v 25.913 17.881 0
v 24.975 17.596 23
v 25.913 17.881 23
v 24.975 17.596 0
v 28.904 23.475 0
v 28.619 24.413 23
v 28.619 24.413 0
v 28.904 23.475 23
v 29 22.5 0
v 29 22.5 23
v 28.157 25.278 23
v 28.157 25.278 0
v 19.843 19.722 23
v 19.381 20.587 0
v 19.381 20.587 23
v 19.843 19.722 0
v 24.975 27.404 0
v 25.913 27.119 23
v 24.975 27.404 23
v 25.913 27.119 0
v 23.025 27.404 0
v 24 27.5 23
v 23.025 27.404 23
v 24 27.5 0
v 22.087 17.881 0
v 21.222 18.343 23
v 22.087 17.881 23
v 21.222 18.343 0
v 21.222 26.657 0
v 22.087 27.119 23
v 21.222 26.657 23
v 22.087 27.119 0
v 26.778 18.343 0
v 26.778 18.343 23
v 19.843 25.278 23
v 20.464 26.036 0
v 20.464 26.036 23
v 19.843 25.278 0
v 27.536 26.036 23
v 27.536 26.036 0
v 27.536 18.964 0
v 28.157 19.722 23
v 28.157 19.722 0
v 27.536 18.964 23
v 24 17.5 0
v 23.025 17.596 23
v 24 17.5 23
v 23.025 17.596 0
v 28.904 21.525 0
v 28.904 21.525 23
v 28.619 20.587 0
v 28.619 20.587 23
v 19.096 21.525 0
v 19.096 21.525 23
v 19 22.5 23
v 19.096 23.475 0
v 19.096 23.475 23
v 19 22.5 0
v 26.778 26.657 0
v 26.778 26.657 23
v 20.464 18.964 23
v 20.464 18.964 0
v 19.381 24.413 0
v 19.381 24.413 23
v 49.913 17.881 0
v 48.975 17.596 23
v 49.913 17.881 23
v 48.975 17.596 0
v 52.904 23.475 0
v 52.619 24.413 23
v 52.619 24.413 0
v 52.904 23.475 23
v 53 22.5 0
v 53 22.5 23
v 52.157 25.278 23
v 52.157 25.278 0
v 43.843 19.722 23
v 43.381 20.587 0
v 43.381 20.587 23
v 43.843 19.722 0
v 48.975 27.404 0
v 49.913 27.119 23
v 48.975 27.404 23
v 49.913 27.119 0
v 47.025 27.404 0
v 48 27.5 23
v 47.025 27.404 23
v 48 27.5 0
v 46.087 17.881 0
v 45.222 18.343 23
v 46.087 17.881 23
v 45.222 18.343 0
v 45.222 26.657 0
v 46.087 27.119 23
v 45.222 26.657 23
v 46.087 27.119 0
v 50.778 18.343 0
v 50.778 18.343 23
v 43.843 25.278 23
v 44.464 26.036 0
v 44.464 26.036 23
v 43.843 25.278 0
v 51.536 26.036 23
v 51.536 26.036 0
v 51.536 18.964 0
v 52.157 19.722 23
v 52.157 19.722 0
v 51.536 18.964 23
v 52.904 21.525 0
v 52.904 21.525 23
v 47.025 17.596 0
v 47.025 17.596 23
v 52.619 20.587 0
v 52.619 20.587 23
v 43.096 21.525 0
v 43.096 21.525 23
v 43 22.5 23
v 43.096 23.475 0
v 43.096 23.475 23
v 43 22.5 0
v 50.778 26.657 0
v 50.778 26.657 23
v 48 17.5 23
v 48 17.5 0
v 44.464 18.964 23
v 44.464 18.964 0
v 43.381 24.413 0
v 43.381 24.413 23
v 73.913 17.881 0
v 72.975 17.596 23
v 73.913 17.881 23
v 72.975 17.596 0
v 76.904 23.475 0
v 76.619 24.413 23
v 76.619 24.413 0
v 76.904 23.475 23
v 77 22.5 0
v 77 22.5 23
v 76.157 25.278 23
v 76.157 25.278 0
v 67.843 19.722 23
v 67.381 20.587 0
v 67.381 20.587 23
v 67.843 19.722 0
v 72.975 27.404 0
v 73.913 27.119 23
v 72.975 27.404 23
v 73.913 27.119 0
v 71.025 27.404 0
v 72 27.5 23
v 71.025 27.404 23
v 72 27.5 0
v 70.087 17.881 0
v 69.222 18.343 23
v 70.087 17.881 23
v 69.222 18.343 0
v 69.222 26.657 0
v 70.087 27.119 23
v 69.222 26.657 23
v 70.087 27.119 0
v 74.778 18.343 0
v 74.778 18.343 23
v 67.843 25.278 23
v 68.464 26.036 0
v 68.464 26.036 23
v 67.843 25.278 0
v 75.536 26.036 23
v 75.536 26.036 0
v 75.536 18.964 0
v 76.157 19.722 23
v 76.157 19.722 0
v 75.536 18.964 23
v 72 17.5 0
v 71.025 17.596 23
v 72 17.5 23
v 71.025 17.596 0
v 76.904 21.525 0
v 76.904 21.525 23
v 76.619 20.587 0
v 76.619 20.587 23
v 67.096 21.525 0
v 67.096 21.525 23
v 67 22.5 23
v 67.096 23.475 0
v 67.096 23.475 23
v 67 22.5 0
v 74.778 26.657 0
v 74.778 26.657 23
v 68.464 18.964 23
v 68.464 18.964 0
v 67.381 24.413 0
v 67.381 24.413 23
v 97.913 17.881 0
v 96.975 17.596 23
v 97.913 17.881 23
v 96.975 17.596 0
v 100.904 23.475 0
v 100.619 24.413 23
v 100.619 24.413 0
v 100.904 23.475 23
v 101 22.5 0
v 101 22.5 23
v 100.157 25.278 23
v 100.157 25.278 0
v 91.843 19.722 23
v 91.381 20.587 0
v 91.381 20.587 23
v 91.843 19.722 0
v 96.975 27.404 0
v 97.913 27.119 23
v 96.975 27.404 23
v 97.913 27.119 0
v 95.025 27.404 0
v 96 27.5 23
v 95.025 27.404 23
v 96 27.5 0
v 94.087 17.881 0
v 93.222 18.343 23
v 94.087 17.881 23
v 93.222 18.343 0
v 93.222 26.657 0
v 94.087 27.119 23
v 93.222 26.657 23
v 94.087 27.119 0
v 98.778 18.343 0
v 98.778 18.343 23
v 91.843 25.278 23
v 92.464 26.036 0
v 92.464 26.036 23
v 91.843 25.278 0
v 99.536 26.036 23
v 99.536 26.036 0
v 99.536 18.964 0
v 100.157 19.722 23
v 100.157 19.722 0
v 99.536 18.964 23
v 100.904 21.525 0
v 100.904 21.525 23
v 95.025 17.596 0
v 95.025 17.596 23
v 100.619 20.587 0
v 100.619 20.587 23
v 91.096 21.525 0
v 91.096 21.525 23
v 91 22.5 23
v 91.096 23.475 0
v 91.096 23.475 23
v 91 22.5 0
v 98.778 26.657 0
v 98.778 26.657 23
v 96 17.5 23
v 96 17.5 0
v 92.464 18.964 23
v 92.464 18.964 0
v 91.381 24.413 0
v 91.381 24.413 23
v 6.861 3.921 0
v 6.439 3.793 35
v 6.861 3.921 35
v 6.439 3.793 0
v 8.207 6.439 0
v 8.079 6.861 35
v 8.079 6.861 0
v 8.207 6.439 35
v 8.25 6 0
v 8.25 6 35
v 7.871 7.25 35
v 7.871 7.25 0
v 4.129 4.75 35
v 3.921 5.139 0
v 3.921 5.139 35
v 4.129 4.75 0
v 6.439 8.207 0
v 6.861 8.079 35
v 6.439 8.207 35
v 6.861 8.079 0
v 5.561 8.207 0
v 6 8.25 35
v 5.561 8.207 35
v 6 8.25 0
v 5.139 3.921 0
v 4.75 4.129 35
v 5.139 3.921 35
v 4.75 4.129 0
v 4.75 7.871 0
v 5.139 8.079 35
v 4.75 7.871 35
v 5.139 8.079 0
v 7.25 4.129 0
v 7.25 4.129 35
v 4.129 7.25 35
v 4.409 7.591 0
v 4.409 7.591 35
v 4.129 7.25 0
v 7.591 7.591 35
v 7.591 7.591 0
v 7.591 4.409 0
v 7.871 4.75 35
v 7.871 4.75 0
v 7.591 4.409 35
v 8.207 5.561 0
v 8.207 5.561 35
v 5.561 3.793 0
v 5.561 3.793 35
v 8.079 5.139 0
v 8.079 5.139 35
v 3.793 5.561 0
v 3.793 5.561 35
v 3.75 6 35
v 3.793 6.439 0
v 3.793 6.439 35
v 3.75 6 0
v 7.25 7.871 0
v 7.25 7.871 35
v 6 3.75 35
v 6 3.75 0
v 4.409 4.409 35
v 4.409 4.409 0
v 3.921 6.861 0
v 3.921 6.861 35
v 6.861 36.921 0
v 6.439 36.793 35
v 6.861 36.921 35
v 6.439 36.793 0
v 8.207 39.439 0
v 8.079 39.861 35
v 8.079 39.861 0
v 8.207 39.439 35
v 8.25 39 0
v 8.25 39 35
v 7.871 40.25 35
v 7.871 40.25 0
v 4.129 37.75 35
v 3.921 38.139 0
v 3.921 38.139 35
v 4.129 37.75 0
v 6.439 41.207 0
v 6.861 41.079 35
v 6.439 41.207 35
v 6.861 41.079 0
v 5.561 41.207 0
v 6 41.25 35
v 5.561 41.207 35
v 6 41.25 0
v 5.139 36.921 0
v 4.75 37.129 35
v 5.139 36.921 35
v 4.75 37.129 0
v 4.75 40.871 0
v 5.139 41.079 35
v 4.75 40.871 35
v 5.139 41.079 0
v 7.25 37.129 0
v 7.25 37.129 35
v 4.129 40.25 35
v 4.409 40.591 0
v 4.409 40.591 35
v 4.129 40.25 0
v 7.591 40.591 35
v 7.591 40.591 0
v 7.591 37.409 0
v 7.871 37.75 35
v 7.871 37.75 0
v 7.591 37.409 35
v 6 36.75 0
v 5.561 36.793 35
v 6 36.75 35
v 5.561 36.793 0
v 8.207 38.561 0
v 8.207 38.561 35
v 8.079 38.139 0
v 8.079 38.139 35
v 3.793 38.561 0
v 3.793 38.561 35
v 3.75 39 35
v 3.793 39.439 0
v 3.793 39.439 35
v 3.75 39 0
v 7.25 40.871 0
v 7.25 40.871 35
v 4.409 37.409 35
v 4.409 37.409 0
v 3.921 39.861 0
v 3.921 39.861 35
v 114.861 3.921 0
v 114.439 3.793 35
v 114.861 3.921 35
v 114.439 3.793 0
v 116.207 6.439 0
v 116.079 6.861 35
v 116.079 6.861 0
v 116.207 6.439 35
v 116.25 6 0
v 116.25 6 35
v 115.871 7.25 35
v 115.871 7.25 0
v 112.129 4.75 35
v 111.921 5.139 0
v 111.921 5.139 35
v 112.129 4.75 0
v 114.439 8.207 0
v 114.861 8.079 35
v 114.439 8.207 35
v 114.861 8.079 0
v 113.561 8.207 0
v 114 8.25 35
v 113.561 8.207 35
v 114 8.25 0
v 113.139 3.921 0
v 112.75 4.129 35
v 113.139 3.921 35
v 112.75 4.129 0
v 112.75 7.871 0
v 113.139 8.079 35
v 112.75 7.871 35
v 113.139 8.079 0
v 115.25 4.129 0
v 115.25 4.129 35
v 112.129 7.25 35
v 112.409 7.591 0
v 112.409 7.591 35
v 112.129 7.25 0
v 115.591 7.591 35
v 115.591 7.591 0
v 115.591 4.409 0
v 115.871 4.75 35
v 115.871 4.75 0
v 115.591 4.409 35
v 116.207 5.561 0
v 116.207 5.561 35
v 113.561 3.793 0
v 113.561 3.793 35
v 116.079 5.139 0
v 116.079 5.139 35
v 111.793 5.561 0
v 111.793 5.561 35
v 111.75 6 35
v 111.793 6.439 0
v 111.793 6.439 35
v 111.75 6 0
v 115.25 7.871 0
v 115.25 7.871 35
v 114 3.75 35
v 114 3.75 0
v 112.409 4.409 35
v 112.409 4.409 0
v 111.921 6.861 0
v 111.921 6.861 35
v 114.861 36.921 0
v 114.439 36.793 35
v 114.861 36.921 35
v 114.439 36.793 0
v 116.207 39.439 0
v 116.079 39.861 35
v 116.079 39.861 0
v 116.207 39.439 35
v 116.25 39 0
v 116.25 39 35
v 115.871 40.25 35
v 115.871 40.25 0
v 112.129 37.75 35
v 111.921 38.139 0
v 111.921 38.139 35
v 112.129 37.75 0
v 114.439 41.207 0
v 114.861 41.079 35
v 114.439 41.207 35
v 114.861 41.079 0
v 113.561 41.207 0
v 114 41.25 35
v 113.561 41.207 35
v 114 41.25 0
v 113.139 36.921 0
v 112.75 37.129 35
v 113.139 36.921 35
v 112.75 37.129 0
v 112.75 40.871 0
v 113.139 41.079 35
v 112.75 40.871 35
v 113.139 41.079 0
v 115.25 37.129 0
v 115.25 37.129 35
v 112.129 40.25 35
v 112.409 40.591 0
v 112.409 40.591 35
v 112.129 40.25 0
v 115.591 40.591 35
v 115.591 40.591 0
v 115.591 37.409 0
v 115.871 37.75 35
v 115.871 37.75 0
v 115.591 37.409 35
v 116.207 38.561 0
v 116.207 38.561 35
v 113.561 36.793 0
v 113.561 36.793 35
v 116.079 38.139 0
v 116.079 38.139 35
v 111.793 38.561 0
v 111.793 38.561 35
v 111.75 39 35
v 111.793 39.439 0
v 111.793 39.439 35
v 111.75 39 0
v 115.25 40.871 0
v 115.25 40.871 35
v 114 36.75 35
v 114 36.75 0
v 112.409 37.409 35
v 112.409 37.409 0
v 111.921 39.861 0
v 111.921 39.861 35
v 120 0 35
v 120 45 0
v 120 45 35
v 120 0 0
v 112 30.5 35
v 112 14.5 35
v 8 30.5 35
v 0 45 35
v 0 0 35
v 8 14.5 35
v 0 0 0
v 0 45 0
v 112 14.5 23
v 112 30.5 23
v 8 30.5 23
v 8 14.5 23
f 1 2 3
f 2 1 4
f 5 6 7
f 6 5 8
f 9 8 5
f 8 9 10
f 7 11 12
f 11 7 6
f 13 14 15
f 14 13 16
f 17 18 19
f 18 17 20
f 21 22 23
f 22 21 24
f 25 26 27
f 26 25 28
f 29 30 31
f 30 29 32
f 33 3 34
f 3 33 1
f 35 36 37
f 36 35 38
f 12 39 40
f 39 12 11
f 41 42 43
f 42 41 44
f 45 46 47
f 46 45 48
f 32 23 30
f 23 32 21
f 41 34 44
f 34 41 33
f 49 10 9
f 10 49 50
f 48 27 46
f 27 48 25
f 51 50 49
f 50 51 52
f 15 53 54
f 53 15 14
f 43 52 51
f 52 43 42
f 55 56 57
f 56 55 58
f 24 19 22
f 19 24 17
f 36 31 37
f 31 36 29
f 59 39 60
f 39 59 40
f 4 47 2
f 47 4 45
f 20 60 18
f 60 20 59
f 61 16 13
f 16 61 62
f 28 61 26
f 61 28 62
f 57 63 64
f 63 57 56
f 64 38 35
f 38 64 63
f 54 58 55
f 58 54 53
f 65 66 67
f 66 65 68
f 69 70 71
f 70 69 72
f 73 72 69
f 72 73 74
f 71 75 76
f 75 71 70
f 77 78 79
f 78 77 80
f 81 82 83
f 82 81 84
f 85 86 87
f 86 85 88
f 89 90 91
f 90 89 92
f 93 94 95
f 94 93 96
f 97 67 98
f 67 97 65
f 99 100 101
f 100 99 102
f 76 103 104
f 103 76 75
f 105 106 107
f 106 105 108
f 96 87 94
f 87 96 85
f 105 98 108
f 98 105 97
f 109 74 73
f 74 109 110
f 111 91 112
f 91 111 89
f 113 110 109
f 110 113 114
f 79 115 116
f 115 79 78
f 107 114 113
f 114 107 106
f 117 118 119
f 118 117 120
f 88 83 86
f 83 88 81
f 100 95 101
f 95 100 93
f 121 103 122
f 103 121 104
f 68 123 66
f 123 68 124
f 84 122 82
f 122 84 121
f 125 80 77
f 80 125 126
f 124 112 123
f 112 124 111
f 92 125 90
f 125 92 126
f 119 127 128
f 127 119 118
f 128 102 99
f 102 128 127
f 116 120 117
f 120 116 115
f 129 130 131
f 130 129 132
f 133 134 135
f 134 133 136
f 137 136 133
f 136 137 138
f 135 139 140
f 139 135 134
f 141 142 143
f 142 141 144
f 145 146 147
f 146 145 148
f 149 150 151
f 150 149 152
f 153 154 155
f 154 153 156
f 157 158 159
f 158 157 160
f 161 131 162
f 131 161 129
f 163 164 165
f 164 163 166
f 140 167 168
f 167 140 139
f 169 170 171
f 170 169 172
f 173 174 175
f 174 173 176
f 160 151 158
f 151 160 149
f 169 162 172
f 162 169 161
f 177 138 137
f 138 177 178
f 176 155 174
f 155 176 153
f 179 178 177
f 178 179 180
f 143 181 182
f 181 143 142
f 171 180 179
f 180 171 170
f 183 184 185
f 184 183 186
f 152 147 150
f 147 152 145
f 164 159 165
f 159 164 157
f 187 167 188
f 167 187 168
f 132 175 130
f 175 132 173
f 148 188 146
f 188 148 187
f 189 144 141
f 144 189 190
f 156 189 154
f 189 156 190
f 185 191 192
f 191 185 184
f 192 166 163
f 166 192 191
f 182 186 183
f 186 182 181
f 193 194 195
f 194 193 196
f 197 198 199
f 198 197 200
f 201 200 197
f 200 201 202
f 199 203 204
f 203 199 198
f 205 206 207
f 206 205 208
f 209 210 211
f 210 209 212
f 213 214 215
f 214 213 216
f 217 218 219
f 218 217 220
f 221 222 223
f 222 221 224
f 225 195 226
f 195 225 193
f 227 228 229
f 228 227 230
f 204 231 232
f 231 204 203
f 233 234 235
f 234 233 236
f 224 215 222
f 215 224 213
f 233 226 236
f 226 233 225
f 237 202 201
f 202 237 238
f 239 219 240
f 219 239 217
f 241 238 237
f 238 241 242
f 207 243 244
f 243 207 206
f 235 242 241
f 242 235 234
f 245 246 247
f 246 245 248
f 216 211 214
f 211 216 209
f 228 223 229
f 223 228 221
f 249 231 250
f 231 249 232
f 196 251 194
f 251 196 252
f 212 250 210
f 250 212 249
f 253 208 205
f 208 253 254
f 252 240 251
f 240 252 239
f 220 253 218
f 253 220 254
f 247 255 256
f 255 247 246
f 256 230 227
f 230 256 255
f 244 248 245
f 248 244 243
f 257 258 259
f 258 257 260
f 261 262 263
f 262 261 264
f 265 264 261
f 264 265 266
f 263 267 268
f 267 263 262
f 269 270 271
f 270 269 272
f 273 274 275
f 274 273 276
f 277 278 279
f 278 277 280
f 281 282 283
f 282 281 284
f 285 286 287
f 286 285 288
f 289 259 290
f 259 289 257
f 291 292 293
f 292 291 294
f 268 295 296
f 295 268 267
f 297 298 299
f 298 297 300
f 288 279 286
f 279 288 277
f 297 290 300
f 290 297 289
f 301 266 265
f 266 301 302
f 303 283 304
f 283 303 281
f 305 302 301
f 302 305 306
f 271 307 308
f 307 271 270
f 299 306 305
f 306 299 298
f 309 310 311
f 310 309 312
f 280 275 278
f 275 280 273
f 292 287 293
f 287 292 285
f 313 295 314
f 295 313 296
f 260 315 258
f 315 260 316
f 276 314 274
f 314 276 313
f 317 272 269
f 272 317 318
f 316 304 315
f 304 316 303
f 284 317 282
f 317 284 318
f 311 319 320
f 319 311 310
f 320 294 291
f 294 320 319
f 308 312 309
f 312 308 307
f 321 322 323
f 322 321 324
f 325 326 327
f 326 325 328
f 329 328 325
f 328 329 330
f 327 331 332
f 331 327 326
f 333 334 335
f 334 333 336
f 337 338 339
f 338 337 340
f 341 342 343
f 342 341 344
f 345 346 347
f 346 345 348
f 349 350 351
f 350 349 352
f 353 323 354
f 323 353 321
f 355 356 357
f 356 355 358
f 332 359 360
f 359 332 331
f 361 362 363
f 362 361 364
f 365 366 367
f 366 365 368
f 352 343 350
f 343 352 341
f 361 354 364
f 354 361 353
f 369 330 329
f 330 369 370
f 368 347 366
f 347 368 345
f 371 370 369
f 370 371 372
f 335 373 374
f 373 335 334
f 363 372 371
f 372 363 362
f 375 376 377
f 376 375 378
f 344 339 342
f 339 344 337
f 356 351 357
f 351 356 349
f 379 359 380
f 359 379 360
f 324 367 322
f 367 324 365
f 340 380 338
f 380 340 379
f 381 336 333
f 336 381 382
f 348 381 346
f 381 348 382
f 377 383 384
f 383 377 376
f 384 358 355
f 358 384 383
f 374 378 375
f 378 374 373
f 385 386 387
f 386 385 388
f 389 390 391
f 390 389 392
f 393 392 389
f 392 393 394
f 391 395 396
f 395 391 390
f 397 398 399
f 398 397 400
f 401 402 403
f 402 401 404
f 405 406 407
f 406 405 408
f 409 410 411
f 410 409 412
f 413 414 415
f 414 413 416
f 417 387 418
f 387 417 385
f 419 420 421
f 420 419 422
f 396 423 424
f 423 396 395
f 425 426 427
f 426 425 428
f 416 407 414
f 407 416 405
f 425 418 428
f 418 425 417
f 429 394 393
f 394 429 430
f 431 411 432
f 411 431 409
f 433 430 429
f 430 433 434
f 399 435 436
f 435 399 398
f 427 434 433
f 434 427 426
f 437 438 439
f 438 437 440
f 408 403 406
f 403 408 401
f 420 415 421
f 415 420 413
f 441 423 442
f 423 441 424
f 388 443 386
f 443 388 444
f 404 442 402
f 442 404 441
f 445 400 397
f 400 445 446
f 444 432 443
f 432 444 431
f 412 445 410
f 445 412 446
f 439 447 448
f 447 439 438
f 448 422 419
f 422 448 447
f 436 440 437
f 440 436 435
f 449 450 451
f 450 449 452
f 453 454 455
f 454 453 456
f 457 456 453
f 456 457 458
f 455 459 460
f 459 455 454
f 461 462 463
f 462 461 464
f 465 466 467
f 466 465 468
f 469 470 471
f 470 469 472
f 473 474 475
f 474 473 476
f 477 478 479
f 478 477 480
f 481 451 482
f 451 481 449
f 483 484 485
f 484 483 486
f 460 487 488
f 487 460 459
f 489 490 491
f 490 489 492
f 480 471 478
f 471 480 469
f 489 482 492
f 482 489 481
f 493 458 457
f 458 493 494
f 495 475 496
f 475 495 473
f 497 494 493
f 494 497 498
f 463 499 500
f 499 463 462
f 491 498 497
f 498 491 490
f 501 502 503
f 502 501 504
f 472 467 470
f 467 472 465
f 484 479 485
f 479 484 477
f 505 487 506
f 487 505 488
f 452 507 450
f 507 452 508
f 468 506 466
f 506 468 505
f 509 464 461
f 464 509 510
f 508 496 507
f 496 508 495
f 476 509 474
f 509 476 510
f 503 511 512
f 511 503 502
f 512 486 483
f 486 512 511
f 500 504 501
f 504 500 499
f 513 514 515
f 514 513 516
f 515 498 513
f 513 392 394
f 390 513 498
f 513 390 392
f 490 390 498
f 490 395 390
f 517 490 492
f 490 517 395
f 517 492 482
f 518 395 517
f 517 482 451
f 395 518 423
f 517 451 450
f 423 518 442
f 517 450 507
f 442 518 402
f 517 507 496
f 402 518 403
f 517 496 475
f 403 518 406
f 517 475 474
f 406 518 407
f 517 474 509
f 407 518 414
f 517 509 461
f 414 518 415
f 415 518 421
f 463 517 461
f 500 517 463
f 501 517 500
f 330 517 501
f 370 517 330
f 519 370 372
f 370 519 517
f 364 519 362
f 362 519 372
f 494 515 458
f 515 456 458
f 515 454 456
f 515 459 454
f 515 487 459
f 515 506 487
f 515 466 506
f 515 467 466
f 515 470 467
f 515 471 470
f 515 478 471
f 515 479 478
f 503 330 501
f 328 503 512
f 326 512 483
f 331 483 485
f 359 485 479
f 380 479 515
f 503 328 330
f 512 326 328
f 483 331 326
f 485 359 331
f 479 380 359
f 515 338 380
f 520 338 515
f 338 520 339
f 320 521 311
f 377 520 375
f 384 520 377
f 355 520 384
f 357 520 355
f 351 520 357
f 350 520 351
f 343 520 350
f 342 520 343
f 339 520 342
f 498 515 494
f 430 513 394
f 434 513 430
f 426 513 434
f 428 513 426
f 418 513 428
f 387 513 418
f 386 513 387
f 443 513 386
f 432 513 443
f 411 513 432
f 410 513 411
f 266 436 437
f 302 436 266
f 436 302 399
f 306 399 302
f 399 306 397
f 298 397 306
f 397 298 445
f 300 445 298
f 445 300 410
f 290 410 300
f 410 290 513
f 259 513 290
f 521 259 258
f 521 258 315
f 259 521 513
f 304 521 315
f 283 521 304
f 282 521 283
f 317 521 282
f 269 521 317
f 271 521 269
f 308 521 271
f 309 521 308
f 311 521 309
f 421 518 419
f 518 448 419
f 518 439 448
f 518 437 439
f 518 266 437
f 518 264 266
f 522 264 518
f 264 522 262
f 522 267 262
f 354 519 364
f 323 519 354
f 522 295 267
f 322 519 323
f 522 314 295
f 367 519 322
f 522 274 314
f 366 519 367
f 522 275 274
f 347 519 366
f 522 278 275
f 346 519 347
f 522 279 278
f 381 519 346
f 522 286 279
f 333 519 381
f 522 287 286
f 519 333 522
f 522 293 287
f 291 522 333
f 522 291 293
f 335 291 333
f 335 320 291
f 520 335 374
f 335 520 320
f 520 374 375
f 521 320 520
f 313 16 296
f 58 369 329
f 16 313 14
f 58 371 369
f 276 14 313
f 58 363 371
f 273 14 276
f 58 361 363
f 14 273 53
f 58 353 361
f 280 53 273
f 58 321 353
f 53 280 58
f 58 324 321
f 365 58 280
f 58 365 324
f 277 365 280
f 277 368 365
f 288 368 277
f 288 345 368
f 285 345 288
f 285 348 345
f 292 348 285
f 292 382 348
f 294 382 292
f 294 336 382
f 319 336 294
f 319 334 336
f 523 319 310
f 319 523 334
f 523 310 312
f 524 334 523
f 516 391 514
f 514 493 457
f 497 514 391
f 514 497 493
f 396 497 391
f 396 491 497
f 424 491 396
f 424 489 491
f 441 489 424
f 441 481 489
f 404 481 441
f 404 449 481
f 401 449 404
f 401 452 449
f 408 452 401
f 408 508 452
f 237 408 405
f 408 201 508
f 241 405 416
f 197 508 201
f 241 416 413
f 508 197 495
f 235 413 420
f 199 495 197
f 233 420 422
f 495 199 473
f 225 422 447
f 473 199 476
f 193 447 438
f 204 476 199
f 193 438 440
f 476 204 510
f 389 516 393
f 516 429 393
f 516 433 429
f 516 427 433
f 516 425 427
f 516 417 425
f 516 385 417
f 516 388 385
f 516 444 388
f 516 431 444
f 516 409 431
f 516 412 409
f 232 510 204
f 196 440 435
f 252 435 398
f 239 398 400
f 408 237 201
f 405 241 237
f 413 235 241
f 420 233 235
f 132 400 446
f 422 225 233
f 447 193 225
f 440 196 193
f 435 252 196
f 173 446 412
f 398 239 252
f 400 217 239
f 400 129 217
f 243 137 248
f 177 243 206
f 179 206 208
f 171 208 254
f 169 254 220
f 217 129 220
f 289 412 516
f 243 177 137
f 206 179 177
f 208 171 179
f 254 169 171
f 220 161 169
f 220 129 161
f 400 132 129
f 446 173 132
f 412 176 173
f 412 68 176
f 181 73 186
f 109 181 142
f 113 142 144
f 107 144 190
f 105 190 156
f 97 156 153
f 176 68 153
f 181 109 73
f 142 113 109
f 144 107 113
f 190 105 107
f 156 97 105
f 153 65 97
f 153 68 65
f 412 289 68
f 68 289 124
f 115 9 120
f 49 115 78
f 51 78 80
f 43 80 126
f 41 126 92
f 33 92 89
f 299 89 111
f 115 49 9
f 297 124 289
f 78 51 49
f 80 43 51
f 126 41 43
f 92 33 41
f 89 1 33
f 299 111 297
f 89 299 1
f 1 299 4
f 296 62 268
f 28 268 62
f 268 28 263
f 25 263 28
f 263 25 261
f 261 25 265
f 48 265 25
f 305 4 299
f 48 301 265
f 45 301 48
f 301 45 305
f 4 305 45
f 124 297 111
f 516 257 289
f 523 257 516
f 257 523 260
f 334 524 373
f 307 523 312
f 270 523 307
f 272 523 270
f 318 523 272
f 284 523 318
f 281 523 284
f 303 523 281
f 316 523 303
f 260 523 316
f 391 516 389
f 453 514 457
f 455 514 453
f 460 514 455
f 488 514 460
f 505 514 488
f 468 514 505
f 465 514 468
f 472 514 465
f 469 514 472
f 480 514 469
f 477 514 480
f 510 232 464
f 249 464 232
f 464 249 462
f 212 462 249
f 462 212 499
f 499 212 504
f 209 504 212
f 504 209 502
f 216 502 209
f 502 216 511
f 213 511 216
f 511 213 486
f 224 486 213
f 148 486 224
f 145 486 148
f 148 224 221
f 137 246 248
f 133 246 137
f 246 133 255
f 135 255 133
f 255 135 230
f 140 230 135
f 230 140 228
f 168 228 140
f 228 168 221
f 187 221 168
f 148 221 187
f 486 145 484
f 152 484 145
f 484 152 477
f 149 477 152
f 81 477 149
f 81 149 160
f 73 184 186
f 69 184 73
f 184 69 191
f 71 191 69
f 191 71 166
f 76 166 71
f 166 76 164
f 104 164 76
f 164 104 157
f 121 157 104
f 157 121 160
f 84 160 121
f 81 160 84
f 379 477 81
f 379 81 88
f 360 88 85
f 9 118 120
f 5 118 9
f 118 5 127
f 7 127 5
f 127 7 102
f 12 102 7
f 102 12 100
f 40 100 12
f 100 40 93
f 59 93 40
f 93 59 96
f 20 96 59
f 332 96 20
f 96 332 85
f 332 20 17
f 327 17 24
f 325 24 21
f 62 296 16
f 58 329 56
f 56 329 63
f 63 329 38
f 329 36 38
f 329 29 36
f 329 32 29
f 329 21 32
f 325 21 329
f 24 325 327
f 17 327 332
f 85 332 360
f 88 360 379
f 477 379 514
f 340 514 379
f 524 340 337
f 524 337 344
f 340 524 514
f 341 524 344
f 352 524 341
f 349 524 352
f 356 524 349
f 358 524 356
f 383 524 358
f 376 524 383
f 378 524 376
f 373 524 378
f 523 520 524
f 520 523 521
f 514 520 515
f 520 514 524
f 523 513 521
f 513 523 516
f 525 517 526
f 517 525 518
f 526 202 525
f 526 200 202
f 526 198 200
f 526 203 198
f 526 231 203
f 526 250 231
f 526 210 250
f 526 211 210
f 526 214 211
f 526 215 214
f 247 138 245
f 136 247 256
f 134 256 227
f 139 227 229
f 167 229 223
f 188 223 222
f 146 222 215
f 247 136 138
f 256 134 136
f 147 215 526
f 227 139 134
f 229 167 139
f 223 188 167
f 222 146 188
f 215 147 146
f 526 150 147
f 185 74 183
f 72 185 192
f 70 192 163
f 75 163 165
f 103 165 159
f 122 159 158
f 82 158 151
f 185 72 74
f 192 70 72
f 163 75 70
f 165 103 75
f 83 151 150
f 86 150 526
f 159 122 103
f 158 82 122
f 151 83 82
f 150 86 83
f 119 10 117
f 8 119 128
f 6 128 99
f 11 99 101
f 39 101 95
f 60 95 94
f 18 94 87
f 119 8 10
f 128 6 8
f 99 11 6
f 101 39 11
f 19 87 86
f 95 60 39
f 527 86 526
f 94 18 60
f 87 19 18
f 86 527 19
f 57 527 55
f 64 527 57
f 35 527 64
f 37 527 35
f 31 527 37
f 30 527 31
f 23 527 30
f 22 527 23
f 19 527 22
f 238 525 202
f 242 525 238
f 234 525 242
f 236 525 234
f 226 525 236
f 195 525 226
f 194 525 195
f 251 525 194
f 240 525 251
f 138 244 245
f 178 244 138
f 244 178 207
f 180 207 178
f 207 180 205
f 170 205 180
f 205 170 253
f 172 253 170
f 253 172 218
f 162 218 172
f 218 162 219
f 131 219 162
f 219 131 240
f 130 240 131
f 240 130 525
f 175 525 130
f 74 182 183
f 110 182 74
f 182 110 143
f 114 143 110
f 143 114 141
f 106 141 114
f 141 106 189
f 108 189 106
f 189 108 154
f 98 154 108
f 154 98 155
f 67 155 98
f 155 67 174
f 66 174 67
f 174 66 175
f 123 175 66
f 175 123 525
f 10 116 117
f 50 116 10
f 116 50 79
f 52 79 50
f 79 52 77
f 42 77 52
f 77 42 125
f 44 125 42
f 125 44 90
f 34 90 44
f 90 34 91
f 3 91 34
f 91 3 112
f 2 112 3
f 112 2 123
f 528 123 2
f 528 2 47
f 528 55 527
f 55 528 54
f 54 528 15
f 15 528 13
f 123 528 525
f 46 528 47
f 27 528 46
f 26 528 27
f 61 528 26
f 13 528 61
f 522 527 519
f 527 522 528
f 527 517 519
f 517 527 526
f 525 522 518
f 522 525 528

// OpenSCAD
$fn = 32;

// ----------------------------------------------------------------------
// Manifold block: gallery_top manifold
// ----------------------------------------------------------------------

// --- parameters (mm) ---
block_l = 120;            // block length, X
block_w = 45;             // block width, Y
block_h = 35;             // block height, Z
port_d = 10;              // port bore diameter
port_pitch = 24;          // port pitch along X
gallery_d = 16;           // top gallery width, Y
gallery_depth = 12;       // gallery pocket depth
wall_p = 8;               // gallery end wall thickness, X
mnt_d = 4.5;              // mounting hole diameter
mnt_in = 6;               // mounting hole inset from the edges

n_ports = 4;  // ports in the row
port_x0 = (block_l - (n_ports - 1) * port_pitch) / 2;  // first port X

difference() {
  cube([block_l, block_w, block_h]);
  for (i = [0 : n_ports - 1])
    translate([port_x0 + i * port_pitch, block_w / 2, -1])
      cylinder(h = block_h + 2, d = port_d);
  translate([wall_p, block_w / 2 - gallery_d / 2, block_h - gallery_depth])
    cube([block_l - 2 * wall_p, gallery_d, gallery_depth + 1]);
  for (cx = [mnt_in, block_l - mnt_in])
    for (cy = [mnt_in, block_w - mnt_in])
      translate([cx, cy, -1]) cylinder(h = block_h + 2, d = mnt_d);
}
